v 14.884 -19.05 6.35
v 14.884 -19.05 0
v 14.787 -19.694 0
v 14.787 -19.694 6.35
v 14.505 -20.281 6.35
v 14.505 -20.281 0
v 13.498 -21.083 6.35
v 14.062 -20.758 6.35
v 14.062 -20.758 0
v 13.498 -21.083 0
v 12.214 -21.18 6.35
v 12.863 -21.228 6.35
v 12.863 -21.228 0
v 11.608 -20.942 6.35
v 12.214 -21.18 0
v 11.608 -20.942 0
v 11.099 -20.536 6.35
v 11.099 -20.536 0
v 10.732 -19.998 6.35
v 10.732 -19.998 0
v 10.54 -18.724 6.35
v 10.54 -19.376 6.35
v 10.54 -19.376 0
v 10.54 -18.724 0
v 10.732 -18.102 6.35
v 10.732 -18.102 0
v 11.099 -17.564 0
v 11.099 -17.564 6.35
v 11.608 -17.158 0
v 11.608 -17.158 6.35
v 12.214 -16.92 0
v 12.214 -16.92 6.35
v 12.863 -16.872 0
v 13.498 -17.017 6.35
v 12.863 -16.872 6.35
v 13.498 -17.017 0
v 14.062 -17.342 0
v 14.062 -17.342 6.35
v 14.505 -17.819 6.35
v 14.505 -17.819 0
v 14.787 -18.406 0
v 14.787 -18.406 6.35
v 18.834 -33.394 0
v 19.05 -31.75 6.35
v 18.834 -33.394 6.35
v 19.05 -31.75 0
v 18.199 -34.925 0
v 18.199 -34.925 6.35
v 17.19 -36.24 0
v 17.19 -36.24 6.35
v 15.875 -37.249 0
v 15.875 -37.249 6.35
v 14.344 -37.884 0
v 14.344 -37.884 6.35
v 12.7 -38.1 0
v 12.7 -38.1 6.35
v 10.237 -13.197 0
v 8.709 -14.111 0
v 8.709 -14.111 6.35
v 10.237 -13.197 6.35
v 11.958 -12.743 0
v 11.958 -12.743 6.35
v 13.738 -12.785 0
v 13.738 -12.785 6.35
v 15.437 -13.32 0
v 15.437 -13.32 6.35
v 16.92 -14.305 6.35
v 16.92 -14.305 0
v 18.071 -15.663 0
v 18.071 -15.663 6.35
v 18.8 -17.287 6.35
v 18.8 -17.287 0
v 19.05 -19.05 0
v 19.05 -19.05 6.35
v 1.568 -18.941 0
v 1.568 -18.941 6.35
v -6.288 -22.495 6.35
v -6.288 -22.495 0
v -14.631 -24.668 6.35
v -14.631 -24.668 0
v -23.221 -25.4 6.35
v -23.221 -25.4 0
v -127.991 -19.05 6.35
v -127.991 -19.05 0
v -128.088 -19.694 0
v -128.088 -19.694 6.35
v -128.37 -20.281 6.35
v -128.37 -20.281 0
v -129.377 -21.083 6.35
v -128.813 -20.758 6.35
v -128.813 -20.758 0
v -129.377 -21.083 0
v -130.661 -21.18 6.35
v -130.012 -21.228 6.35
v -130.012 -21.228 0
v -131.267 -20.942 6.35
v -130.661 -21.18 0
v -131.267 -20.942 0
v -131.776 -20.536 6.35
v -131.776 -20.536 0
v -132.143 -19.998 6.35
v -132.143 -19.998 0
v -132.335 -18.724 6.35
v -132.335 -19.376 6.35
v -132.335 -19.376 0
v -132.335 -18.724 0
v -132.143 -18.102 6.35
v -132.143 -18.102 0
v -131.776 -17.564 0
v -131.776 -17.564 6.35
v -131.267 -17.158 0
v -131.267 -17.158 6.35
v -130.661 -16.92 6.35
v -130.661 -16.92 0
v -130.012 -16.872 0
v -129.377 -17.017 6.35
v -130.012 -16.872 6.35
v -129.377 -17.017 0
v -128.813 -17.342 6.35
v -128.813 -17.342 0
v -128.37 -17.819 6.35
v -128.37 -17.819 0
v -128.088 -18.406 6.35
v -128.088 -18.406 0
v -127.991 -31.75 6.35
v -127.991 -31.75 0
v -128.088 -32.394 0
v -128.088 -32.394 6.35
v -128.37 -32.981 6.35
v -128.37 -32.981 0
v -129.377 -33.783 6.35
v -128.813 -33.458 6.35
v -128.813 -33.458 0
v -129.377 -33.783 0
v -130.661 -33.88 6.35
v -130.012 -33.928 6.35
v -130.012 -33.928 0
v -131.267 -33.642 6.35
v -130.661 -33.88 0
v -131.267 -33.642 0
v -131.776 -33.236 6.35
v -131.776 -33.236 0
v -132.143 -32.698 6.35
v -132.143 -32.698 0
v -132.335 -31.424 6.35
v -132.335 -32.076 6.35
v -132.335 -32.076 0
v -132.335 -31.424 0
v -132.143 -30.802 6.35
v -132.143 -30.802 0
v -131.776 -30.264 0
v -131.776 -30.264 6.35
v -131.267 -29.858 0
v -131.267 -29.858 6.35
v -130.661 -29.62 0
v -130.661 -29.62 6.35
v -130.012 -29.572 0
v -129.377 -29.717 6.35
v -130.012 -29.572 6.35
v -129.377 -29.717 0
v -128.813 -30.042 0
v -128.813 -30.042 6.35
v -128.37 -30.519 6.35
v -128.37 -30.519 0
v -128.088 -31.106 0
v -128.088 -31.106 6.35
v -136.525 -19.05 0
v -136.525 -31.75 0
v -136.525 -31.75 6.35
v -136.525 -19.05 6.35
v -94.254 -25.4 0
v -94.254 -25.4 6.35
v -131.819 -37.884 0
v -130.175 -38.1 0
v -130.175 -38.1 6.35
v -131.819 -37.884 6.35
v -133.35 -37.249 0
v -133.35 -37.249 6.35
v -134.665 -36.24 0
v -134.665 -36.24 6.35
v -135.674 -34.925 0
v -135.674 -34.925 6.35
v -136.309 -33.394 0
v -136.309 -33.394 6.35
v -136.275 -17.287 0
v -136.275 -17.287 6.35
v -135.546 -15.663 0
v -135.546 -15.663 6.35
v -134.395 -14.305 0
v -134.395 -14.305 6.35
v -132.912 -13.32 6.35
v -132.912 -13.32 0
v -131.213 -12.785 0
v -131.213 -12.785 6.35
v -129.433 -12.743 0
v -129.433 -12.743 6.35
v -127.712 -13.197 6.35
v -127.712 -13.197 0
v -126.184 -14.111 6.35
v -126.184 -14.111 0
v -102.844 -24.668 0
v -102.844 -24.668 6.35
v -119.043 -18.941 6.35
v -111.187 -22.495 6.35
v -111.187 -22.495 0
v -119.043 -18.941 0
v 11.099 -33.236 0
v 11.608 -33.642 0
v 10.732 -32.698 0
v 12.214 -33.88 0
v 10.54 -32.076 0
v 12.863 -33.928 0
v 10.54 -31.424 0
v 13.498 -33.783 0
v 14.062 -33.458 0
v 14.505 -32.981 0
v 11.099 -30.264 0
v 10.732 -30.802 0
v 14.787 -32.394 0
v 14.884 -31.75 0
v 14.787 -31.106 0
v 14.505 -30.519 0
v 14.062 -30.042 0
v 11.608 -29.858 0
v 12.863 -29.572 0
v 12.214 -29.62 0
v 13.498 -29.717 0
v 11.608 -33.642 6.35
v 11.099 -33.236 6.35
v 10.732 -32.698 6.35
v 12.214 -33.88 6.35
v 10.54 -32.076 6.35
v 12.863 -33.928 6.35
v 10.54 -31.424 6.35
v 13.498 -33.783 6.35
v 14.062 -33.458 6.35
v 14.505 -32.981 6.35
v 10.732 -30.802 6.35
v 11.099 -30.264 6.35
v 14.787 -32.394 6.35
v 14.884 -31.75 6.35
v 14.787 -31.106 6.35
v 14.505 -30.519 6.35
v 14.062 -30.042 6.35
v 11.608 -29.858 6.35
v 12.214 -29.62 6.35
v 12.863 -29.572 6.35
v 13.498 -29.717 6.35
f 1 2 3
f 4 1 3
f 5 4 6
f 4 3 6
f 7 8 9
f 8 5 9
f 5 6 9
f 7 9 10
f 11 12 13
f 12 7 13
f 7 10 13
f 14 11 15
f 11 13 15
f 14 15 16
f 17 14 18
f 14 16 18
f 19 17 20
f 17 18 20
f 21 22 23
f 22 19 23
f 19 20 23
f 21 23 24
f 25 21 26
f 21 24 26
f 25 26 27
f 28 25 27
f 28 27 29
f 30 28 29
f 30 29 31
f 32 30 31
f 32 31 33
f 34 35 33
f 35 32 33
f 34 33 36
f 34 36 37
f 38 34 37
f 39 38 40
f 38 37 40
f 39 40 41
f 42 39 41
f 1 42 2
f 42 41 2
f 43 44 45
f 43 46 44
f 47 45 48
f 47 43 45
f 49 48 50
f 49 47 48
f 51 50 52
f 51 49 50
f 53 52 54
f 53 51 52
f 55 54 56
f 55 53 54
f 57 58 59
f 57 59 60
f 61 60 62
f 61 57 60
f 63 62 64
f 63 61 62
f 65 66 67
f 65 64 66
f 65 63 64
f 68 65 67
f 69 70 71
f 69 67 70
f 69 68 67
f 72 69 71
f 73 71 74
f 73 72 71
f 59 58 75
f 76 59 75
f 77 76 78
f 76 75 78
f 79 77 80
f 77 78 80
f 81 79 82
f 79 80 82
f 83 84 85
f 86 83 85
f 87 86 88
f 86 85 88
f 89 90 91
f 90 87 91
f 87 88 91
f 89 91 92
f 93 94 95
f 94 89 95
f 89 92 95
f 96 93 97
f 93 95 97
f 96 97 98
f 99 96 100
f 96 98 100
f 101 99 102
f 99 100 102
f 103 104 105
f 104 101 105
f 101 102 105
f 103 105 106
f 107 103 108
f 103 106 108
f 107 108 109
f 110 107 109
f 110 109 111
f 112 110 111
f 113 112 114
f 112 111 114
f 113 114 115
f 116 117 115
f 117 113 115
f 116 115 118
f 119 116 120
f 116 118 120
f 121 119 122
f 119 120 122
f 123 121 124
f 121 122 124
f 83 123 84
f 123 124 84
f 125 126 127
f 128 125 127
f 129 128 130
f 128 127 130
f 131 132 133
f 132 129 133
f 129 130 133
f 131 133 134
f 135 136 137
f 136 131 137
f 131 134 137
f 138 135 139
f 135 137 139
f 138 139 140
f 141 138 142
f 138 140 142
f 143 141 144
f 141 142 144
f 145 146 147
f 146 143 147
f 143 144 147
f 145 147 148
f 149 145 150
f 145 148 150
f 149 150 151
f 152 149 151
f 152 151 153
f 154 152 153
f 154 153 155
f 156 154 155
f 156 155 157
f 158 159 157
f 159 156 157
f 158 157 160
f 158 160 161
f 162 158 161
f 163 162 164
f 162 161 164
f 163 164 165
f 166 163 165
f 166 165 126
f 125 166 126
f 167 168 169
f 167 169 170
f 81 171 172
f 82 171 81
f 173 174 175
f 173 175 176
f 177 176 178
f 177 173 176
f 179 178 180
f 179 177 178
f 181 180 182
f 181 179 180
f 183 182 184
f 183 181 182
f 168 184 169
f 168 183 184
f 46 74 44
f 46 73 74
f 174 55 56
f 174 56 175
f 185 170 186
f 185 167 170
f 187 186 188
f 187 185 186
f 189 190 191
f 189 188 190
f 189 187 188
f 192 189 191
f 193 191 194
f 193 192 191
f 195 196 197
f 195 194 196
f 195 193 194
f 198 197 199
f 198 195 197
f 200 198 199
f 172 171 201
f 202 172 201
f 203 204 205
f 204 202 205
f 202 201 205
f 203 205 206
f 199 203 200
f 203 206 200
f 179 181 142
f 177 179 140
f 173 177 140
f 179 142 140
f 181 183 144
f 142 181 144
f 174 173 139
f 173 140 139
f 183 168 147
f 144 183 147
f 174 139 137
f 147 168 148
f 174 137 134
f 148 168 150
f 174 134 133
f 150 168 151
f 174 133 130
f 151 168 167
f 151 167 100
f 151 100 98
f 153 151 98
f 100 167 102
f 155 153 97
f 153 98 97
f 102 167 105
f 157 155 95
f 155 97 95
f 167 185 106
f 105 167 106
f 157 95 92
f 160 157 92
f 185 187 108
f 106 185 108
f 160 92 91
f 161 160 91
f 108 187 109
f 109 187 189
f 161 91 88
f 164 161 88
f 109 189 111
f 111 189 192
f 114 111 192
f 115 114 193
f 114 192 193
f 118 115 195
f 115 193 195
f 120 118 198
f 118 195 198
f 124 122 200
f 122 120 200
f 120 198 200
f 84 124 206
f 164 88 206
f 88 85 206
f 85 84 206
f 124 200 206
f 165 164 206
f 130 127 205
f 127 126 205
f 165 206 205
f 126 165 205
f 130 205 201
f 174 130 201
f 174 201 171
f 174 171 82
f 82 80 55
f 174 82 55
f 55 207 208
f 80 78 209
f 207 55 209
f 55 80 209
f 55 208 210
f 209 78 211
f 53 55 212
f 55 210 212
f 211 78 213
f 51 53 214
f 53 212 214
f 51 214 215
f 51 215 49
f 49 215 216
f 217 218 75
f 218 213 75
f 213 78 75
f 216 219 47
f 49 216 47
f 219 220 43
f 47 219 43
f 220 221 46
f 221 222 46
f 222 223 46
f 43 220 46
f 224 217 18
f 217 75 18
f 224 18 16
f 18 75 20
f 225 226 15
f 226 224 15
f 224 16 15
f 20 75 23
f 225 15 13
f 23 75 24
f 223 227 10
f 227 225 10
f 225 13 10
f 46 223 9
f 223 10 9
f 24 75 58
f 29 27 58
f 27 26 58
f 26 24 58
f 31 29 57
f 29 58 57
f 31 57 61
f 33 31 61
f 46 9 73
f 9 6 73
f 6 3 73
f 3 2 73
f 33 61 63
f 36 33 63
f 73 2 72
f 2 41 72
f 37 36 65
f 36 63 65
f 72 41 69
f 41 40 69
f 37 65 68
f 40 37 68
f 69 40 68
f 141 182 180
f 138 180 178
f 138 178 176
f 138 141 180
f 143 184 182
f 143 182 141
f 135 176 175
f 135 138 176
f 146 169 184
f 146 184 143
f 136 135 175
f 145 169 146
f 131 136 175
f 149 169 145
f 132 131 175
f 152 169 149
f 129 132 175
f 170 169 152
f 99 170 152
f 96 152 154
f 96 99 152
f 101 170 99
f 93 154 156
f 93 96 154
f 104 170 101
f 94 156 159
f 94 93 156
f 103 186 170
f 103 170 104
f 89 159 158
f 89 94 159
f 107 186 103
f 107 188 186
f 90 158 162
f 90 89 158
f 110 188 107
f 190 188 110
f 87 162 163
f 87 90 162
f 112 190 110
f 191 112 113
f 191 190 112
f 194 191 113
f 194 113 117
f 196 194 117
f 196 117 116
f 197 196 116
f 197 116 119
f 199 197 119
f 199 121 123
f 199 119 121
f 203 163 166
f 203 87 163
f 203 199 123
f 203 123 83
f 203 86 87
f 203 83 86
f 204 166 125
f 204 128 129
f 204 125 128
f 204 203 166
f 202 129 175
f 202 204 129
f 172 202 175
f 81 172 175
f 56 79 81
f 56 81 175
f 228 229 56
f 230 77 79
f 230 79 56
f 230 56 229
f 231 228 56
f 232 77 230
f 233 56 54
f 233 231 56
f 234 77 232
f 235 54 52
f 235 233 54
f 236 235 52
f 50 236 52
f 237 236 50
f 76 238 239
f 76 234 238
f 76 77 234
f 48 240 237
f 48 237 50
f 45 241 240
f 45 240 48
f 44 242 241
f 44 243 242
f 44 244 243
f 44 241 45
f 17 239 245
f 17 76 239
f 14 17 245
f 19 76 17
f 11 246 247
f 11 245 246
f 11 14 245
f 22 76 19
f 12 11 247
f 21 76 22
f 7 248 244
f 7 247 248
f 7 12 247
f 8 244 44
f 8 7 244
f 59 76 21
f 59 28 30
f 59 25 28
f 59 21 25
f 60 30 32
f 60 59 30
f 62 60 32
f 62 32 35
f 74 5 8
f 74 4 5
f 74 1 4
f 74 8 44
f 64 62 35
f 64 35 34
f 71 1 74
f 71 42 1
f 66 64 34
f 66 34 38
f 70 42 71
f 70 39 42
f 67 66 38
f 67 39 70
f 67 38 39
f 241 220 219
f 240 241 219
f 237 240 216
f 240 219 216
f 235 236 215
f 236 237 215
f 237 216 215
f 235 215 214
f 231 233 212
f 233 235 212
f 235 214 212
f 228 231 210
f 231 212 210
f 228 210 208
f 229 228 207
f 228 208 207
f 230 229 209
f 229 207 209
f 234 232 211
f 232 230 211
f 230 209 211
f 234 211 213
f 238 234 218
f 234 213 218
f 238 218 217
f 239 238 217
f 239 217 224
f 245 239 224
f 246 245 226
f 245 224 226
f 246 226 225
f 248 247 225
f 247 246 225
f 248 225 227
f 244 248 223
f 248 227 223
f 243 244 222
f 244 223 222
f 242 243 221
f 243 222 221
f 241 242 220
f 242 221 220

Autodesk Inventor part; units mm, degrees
ref_plane "YZ Plane" through (0, 0, 0) normal (1, 0, 0) x (0, 1, 0)
ref_plane "XZ Plane" through (0, 0, 0) normal (0, 1, 0) x (-1, 0, 0)
ref_plane "XY Plane" through (0, 0, 0) normal (0, 0, 1) x (1, 0, 0)
sketch "Sketch1" plane through (0, 0, 0) normal (0, 0, 1) x (1, 0, 0)
  circle A0 centre (12.7, -31.75) radius 2.1844 projected
  circle A1 centre (-130.175, -31.75) radius 2.1844 projected
  circle A2 centre (-130.175, -19.05) radius 2.1844 projected
  circle A3 centre (12.7, -19.05) radius 2.1844 projected
  line L0 (12.7, -38.1) -> (-130.175, -38.1)
  line L1 (-136.525, -31.75) -> (-136.525, -19.05)
  line L2 (19.05, -19.05) -> (19.05, -31.75)
  arc A4 (-126.1838, -14.1111) -> (-136.525, -19.05) centre (-130.175, -19.05) ccw
  arc A5 (19.05, -19.05) -> (8.7088, -14.1111) centre (12.7, -19.05) ccw
  arc A6 (-23.221, -25.4) -> (8.7088, -14.1111) centre (-23.221, 25.4) ccw
  arc A7 (-126.1838, -14.1111) -> (-94.254, -25.4) centre (-94.254, 25.4) ccw
  arc A8 (12.7, -38.1) -> (19.05, -31.75) centre (12.7, -31.75) ccw
  arc A9 (-136.525, -31.75) -> (-130.175, -38.1) centre (-130.175, -31.75) ccw
  line L3 (-94.254, -25.4) -> (-23.221, -25.4)
  point P0 (0, 0)
  dimension "d0" = 12.7
  dimension "d1" = 6.35
  dimension "d2" = 6.35
  dimension "d3" = 12.7
  dimension "d4" = 50.8
  dimension "d6" = 6.35
extrude "Extrusion1" add sketch "Sketch1" along normal blind 6.35
properties part number "parkbar"
